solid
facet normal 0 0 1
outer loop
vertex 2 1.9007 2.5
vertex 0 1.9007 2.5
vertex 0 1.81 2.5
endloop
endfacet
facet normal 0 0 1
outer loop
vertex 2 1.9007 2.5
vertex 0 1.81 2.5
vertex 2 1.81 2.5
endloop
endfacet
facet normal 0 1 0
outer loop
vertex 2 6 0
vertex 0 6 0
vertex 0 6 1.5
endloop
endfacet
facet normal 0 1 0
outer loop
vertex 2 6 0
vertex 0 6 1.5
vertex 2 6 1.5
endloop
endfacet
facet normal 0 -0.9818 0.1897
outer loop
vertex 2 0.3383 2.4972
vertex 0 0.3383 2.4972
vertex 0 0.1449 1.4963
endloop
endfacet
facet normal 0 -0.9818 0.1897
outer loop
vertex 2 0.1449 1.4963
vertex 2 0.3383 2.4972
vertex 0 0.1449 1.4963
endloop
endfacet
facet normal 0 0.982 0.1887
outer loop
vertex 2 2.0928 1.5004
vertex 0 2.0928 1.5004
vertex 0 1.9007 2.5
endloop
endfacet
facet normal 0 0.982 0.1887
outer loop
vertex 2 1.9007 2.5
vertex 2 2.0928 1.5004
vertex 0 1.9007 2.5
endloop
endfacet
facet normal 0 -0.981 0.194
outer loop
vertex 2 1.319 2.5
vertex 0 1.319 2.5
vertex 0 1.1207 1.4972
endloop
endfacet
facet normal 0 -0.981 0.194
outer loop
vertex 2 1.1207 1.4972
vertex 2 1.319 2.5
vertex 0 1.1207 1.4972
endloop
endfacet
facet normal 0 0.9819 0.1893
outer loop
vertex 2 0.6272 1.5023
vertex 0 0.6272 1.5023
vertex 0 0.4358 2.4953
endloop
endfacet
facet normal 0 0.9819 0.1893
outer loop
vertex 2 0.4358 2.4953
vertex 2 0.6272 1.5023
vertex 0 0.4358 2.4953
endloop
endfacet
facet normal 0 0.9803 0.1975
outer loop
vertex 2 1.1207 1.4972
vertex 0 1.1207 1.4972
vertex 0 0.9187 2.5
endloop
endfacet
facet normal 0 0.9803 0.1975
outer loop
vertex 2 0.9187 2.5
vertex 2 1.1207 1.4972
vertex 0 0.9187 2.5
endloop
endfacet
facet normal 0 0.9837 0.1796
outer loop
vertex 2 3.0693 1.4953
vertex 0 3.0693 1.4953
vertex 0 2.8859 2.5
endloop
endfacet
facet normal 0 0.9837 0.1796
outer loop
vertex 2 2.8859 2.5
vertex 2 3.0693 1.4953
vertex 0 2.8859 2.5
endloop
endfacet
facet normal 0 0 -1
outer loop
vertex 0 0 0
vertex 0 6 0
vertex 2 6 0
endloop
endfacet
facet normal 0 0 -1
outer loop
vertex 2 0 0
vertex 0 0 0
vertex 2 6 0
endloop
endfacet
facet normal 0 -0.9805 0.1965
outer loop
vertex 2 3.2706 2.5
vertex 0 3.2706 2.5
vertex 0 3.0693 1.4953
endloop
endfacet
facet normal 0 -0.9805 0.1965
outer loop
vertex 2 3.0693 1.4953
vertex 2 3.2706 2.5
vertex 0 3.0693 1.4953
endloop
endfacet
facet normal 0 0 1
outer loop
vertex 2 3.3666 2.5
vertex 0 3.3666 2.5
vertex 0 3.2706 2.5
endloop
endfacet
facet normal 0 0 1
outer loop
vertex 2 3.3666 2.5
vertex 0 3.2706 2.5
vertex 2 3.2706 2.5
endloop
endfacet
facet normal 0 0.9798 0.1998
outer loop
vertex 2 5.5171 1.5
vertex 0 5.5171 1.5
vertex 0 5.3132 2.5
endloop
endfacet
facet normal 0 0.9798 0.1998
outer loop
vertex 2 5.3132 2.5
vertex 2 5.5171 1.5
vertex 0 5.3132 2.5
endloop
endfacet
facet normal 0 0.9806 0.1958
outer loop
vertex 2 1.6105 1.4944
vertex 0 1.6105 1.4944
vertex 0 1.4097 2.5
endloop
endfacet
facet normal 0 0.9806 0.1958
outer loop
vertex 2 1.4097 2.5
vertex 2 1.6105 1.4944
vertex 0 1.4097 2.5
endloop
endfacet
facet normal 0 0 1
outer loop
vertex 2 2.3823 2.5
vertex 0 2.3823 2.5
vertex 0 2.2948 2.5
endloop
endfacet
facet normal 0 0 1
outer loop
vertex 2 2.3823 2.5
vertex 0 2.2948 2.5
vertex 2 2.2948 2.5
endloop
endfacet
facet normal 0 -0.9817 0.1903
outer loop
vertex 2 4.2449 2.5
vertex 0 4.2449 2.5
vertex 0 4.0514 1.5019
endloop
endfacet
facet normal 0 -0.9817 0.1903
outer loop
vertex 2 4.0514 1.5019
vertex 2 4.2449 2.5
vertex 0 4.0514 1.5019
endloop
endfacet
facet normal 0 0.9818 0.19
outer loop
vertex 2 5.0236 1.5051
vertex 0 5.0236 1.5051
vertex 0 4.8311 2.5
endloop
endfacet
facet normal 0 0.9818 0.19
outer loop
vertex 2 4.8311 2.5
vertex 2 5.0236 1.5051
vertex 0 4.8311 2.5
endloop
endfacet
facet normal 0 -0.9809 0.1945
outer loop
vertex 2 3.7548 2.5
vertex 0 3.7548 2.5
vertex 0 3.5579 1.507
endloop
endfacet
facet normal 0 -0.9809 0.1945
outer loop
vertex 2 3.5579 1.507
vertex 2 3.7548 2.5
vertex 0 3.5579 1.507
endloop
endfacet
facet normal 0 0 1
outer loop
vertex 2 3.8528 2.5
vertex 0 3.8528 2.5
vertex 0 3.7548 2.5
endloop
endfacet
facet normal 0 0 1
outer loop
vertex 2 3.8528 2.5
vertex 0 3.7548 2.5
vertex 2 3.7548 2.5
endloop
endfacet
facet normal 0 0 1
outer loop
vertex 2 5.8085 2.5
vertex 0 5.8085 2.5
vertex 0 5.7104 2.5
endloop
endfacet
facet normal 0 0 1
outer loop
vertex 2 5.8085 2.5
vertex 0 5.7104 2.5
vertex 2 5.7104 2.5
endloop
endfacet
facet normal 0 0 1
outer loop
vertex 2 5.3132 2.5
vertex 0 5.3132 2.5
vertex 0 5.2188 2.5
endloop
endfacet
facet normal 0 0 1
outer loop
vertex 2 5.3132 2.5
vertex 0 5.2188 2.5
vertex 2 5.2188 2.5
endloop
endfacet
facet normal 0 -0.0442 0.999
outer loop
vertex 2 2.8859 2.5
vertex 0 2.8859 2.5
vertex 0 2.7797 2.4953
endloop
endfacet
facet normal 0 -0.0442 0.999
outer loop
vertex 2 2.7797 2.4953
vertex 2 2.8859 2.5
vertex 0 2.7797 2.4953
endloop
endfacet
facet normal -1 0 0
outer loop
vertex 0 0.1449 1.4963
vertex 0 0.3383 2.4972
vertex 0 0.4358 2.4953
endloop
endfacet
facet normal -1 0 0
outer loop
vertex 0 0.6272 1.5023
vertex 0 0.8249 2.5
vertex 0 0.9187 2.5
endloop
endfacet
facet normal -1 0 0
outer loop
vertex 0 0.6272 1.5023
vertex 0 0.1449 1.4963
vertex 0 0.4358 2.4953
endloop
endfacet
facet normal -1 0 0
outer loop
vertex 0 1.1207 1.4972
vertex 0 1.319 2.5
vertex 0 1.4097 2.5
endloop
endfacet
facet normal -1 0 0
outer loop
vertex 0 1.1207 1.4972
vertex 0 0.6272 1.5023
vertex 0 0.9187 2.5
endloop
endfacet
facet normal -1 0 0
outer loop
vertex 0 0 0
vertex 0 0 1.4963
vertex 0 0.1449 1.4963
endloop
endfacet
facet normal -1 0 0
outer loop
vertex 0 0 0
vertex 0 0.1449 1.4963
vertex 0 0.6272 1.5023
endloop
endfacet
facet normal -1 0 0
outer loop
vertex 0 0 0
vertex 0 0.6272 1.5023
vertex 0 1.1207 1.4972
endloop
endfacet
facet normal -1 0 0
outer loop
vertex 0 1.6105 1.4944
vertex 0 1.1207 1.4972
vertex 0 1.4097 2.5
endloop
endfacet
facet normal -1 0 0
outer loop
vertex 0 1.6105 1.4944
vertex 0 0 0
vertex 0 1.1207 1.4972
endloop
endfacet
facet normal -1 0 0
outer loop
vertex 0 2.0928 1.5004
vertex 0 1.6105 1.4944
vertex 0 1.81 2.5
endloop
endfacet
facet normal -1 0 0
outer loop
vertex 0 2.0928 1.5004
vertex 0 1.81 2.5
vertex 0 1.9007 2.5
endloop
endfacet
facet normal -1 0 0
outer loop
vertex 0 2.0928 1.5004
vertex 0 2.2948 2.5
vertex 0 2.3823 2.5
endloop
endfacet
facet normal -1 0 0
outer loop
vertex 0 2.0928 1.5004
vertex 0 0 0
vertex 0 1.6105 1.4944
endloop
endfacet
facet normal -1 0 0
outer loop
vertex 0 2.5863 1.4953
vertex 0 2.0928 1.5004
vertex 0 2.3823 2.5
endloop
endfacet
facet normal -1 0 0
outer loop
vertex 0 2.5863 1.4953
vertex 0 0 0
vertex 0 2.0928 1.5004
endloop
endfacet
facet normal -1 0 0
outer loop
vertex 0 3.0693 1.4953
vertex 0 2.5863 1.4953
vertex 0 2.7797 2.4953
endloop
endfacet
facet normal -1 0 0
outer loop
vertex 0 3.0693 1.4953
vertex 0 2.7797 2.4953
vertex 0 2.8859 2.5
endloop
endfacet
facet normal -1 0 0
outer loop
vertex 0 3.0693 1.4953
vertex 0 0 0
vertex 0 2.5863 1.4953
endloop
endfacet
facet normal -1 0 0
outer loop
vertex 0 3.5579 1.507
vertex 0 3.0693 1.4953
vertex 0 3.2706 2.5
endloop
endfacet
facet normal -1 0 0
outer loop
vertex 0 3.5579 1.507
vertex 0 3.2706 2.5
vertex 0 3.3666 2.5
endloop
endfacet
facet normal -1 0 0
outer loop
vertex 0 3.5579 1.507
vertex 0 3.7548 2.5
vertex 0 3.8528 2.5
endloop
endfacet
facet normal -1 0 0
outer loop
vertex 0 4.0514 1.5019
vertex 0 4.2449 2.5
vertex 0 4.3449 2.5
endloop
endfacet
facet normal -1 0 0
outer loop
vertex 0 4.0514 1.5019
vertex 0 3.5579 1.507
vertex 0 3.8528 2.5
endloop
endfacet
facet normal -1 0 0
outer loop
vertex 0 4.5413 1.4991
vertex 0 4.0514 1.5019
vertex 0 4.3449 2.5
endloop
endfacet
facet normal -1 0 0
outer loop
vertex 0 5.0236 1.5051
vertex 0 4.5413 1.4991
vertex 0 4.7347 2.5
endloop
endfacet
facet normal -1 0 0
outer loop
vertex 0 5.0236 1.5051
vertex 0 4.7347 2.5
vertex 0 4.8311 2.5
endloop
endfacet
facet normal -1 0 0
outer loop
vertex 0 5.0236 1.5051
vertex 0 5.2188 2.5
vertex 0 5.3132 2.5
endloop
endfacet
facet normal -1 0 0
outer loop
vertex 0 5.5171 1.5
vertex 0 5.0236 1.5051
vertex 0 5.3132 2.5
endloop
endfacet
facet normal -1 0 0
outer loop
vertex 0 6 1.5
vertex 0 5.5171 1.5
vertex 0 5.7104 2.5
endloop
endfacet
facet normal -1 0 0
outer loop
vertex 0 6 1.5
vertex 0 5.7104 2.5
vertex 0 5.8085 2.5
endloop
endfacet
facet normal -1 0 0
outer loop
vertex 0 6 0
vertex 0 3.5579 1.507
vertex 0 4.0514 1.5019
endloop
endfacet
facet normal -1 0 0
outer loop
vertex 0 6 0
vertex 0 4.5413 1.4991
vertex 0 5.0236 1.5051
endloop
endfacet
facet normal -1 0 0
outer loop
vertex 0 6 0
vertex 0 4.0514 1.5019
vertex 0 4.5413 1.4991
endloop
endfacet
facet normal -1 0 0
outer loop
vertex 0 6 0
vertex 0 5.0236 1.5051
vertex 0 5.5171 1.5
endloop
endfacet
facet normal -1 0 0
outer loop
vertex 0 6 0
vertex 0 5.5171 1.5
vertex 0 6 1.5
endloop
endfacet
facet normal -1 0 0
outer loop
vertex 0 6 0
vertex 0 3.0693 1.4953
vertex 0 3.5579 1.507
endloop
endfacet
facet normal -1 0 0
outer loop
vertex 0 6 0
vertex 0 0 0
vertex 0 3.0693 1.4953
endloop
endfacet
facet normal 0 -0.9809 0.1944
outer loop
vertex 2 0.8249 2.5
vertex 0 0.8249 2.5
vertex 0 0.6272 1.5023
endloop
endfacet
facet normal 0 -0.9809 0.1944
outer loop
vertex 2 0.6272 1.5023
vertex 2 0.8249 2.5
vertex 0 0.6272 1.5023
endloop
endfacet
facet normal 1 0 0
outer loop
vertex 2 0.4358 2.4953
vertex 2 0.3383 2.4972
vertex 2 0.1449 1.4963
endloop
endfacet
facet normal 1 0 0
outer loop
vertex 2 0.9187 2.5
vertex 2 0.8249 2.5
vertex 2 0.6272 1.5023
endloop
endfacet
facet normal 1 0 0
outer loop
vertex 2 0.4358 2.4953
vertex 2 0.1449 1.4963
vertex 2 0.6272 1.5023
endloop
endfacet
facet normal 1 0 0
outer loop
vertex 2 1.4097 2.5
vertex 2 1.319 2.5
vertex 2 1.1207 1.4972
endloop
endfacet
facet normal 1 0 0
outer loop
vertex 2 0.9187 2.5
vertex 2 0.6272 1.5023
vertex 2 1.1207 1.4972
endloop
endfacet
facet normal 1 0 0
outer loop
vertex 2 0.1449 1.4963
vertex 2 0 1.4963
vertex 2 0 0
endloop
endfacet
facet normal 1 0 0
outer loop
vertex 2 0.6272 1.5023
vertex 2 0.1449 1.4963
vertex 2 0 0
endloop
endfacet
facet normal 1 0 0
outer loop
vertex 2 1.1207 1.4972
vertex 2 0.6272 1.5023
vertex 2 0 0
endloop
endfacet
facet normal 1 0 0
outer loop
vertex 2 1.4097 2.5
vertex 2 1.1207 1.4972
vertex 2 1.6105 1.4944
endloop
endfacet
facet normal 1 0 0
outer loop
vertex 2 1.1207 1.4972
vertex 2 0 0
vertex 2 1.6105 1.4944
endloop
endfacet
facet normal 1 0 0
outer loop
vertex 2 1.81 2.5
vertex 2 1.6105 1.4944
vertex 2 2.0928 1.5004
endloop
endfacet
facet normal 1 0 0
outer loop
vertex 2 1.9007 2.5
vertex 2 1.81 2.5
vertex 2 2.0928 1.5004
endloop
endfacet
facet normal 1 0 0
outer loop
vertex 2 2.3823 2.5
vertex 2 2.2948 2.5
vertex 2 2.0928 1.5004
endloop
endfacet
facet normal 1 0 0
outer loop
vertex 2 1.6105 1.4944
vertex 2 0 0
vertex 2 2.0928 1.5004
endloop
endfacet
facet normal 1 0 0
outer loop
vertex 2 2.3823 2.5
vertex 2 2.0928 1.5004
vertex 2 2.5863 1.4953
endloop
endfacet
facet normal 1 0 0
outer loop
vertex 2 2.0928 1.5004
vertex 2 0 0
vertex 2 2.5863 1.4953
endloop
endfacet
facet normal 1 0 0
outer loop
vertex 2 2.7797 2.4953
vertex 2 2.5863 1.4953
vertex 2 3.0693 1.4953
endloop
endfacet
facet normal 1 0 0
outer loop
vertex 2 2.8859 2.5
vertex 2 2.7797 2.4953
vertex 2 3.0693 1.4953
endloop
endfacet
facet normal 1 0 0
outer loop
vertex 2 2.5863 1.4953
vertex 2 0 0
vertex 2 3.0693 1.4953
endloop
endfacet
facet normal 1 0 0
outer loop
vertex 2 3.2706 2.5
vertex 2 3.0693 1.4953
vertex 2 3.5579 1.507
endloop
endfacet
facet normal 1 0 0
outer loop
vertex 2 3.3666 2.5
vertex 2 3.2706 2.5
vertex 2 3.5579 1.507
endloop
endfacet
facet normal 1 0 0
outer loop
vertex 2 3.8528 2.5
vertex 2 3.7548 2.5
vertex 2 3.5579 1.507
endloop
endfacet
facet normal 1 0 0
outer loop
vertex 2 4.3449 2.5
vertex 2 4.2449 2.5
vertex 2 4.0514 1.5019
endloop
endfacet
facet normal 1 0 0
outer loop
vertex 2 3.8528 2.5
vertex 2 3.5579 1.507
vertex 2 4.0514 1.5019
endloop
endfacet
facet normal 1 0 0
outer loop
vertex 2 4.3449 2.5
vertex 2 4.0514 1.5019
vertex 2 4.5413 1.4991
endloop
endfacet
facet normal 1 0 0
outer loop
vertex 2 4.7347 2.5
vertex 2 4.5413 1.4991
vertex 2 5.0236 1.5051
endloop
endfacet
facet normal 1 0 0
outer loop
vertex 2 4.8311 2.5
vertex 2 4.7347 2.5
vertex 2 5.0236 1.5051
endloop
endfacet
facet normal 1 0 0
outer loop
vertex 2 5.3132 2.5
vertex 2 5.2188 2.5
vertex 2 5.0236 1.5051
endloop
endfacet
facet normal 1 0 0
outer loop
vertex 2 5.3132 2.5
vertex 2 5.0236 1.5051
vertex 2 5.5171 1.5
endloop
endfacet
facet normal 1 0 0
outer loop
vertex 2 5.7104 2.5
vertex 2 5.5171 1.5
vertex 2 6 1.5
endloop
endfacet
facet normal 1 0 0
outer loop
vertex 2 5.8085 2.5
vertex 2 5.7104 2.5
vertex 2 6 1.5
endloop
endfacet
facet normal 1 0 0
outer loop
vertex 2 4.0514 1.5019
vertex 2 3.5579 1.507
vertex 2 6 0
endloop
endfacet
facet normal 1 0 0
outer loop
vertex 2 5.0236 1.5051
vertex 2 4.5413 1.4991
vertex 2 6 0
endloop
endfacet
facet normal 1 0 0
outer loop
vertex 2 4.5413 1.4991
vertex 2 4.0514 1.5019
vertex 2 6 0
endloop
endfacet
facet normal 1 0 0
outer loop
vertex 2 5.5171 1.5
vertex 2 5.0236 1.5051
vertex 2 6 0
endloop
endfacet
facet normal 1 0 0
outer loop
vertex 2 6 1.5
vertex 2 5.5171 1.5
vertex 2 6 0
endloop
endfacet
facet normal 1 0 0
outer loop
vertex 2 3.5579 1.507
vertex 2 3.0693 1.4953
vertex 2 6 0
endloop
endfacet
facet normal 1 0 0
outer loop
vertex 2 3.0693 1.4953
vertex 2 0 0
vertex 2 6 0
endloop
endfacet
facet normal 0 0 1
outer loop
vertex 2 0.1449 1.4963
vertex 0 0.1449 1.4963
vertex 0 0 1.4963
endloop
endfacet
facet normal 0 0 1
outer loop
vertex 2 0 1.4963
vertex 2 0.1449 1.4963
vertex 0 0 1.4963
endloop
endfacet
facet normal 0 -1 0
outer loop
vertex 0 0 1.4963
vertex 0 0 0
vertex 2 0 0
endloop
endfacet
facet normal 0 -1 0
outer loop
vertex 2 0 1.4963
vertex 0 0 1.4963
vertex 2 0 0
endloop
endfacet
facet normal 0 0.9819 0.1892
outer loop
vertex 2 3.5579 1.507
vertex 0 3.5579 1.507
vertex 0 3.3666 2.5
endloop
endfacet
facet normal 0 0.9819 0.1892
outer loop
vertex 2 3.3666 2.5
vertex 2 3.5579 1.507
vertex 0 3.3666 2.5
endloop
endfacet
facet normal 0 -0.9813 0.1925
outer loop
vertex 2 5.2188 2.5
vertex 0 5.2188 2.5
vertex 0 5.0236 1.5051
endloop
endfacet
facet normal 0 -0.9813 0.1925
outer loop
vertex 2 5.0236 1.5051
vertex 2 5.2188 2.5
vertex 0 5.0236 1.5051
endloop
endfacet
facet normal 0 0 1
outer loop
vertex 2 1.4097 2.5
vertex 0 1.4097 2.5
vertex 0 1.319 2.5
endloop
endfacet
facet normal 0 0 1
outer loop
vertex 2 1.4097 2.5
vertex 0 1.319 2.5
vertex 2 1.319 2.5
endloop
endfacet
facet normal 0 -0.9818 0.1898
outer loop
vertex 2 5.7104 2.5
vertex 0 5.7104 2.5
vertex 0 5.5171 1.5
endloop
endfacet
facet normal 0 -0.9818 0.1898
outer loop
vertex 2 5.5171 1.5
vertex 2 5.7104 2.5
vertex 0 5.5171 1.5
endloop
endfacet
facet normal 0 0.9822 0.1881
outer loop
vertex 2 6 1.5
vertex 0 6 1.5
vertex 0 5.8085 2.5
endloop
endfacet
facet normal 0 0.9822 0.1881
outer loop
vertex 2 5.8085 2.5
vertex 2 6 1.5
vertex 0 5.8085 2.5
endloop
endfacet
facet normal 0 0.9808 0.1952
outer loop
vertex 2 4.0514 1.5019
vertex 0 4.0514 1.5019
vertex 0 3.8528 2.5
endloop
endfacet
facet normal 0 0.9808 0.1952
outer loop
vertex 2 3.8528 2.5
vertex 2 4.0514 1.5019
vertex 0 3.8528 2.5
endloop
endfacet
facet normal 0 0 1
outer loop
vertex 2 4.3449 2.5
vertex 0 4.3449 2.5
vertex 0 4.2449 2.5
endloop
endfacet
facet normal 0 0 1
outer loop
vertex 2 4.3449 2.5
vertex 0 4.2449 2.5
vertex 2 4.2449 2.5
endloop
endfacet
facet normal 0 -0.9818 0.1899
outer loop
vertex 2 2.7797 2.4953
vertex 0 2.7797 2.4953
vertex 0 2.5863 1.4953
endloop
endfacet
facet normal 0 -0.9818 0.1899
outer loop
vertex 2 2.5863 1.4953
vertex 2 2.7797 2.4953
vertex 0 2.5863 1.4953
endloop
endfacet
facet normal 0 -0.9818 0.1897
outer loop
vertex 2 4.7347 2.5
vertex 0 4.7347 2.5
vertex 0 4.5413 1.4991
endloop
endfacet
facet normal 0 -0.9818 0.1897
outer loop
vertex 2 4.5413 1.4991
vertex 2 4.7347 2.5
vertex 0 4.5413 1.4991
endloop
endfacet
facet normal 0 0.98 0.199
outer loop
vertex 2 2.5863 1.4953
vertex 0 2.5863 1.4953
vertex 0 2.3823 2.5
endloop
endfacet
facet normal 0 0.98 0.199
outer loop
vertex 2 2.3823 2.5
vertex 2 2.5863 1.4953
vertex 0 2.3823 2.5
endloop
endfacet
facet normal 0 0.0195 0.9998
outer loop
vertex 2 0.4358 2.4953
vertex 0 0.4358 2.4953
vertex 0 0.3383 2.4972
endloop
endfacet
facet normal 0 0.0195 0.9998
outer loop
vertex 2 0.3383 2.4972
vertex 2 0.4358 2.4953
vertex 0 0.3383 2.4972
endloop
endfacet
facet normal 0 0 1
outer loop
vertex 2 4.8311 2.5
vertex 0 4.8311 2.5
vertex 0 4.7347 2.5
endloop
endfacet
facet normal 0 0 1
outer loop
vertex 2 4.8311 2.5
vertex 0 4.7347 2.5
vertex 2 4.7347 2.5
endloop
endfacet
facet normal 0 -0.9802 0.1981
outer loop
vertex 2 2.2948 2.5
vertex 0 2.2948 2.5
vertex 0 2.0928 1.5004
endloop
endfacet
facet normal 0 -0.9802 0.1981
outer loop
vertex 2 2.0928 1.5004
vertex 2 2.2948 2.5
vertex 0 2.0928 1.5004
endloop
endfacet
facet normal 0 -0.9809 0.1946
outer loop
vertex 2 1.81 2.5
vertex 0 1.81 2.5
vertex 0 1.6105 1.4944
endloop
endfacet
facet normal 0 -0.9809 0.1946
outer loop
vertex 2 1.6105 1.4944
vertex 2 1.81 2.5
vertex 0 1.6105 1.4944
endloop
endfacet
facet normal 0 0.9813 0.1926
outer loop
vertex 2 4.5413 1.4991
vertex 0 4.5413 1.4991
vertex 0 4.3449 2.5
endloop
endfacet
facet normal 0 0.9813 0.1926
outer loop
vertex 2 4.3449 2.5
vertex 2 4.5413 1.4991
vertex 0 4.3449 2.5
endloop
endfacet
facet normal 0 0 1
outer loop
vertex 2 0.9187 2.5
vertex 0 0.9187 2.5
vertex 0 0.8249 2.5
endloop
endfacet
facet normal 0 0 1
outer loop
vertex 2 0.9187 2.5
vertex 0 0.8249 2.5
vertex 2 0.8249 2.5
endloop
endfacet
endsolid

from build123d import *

# Parameters (mm, degrees)
CROQUIS1_W              = 2
CROQUIS1_H              = 6
SALIENTE_EXTRUIR1_DEPTH = 2.5
CORTAR_EXTRUIR1_DEPTH   = 7.800735254


with BuildPart() as part:
    # Croquis1 → Saliente-Extruir1 (new body)
    with BuildSketch(Plane.XY):
        with Locations((1, 3)):
            Rectangle(CROQUIS1_W, CROQUIS1_H)
    extrude(amount=SALIENTE_EXTRUIR1_DEPTH)

    # Croquis2 → Cortar-Extruir1 (cut, through all)
    with BuildSketch(Plane(origin=(0, 0, 0), x_dir=(0, 0, -1), z_dir=(1, 0, 0))):
        Polygon((-1.5, 6), (-2.5, 5.80854163), (-2.5, 5.710449631), (-1.5, 5.517083259), (-2.5, 5.313214879), (-2.5, 5.218807214), (-1.505093933, 5.023577449), (-2.5, 4.831133188), (-2.5, 4.734716849), (-1.499108678, 4.541270078), (-2.5, 4.344872298), (-2.5, 4.244926288), (-1.501926313, 4.051435435), (-2.5, 3.852830402), (-2.5, 3.75480643), (-1.507020246, 3.557929626), (-2.5, 3.366554621), (-2.5, 3.270551035), (-1.495260568, 3.069261664), (-2.5, 2.885869762), (-2.495260568, 2.779711295), (-1.495260568, 2.586344923), (-2.5, 2.382343868), (-2.5, 2.294774147), (-1.500354501, 2.092839113), (-2.5, 1.900710404), (-2.5, 1.810013194), (-1.494369246, 1.610531741), (-2.5, 1.40969447), (-2.5, 1.31899726), (-1.497186881, 1.120697099), (-2.5, 0.918678537), (-2.5, 0.824853836), (-1.502280814, 0.627191289), (-2.495260568, 0.435816284), (-2.497186881, 0.338330689), (-1.496295559, 0.144883917), (-1.496295559, 0), (-2.562577576, 0), (-2.562577576, 6), align=None)
    extrude(amount=CORTAR_EXTRUIR1_DEPTH, mode=Mode.SUBTRACT)


solid = part.part
